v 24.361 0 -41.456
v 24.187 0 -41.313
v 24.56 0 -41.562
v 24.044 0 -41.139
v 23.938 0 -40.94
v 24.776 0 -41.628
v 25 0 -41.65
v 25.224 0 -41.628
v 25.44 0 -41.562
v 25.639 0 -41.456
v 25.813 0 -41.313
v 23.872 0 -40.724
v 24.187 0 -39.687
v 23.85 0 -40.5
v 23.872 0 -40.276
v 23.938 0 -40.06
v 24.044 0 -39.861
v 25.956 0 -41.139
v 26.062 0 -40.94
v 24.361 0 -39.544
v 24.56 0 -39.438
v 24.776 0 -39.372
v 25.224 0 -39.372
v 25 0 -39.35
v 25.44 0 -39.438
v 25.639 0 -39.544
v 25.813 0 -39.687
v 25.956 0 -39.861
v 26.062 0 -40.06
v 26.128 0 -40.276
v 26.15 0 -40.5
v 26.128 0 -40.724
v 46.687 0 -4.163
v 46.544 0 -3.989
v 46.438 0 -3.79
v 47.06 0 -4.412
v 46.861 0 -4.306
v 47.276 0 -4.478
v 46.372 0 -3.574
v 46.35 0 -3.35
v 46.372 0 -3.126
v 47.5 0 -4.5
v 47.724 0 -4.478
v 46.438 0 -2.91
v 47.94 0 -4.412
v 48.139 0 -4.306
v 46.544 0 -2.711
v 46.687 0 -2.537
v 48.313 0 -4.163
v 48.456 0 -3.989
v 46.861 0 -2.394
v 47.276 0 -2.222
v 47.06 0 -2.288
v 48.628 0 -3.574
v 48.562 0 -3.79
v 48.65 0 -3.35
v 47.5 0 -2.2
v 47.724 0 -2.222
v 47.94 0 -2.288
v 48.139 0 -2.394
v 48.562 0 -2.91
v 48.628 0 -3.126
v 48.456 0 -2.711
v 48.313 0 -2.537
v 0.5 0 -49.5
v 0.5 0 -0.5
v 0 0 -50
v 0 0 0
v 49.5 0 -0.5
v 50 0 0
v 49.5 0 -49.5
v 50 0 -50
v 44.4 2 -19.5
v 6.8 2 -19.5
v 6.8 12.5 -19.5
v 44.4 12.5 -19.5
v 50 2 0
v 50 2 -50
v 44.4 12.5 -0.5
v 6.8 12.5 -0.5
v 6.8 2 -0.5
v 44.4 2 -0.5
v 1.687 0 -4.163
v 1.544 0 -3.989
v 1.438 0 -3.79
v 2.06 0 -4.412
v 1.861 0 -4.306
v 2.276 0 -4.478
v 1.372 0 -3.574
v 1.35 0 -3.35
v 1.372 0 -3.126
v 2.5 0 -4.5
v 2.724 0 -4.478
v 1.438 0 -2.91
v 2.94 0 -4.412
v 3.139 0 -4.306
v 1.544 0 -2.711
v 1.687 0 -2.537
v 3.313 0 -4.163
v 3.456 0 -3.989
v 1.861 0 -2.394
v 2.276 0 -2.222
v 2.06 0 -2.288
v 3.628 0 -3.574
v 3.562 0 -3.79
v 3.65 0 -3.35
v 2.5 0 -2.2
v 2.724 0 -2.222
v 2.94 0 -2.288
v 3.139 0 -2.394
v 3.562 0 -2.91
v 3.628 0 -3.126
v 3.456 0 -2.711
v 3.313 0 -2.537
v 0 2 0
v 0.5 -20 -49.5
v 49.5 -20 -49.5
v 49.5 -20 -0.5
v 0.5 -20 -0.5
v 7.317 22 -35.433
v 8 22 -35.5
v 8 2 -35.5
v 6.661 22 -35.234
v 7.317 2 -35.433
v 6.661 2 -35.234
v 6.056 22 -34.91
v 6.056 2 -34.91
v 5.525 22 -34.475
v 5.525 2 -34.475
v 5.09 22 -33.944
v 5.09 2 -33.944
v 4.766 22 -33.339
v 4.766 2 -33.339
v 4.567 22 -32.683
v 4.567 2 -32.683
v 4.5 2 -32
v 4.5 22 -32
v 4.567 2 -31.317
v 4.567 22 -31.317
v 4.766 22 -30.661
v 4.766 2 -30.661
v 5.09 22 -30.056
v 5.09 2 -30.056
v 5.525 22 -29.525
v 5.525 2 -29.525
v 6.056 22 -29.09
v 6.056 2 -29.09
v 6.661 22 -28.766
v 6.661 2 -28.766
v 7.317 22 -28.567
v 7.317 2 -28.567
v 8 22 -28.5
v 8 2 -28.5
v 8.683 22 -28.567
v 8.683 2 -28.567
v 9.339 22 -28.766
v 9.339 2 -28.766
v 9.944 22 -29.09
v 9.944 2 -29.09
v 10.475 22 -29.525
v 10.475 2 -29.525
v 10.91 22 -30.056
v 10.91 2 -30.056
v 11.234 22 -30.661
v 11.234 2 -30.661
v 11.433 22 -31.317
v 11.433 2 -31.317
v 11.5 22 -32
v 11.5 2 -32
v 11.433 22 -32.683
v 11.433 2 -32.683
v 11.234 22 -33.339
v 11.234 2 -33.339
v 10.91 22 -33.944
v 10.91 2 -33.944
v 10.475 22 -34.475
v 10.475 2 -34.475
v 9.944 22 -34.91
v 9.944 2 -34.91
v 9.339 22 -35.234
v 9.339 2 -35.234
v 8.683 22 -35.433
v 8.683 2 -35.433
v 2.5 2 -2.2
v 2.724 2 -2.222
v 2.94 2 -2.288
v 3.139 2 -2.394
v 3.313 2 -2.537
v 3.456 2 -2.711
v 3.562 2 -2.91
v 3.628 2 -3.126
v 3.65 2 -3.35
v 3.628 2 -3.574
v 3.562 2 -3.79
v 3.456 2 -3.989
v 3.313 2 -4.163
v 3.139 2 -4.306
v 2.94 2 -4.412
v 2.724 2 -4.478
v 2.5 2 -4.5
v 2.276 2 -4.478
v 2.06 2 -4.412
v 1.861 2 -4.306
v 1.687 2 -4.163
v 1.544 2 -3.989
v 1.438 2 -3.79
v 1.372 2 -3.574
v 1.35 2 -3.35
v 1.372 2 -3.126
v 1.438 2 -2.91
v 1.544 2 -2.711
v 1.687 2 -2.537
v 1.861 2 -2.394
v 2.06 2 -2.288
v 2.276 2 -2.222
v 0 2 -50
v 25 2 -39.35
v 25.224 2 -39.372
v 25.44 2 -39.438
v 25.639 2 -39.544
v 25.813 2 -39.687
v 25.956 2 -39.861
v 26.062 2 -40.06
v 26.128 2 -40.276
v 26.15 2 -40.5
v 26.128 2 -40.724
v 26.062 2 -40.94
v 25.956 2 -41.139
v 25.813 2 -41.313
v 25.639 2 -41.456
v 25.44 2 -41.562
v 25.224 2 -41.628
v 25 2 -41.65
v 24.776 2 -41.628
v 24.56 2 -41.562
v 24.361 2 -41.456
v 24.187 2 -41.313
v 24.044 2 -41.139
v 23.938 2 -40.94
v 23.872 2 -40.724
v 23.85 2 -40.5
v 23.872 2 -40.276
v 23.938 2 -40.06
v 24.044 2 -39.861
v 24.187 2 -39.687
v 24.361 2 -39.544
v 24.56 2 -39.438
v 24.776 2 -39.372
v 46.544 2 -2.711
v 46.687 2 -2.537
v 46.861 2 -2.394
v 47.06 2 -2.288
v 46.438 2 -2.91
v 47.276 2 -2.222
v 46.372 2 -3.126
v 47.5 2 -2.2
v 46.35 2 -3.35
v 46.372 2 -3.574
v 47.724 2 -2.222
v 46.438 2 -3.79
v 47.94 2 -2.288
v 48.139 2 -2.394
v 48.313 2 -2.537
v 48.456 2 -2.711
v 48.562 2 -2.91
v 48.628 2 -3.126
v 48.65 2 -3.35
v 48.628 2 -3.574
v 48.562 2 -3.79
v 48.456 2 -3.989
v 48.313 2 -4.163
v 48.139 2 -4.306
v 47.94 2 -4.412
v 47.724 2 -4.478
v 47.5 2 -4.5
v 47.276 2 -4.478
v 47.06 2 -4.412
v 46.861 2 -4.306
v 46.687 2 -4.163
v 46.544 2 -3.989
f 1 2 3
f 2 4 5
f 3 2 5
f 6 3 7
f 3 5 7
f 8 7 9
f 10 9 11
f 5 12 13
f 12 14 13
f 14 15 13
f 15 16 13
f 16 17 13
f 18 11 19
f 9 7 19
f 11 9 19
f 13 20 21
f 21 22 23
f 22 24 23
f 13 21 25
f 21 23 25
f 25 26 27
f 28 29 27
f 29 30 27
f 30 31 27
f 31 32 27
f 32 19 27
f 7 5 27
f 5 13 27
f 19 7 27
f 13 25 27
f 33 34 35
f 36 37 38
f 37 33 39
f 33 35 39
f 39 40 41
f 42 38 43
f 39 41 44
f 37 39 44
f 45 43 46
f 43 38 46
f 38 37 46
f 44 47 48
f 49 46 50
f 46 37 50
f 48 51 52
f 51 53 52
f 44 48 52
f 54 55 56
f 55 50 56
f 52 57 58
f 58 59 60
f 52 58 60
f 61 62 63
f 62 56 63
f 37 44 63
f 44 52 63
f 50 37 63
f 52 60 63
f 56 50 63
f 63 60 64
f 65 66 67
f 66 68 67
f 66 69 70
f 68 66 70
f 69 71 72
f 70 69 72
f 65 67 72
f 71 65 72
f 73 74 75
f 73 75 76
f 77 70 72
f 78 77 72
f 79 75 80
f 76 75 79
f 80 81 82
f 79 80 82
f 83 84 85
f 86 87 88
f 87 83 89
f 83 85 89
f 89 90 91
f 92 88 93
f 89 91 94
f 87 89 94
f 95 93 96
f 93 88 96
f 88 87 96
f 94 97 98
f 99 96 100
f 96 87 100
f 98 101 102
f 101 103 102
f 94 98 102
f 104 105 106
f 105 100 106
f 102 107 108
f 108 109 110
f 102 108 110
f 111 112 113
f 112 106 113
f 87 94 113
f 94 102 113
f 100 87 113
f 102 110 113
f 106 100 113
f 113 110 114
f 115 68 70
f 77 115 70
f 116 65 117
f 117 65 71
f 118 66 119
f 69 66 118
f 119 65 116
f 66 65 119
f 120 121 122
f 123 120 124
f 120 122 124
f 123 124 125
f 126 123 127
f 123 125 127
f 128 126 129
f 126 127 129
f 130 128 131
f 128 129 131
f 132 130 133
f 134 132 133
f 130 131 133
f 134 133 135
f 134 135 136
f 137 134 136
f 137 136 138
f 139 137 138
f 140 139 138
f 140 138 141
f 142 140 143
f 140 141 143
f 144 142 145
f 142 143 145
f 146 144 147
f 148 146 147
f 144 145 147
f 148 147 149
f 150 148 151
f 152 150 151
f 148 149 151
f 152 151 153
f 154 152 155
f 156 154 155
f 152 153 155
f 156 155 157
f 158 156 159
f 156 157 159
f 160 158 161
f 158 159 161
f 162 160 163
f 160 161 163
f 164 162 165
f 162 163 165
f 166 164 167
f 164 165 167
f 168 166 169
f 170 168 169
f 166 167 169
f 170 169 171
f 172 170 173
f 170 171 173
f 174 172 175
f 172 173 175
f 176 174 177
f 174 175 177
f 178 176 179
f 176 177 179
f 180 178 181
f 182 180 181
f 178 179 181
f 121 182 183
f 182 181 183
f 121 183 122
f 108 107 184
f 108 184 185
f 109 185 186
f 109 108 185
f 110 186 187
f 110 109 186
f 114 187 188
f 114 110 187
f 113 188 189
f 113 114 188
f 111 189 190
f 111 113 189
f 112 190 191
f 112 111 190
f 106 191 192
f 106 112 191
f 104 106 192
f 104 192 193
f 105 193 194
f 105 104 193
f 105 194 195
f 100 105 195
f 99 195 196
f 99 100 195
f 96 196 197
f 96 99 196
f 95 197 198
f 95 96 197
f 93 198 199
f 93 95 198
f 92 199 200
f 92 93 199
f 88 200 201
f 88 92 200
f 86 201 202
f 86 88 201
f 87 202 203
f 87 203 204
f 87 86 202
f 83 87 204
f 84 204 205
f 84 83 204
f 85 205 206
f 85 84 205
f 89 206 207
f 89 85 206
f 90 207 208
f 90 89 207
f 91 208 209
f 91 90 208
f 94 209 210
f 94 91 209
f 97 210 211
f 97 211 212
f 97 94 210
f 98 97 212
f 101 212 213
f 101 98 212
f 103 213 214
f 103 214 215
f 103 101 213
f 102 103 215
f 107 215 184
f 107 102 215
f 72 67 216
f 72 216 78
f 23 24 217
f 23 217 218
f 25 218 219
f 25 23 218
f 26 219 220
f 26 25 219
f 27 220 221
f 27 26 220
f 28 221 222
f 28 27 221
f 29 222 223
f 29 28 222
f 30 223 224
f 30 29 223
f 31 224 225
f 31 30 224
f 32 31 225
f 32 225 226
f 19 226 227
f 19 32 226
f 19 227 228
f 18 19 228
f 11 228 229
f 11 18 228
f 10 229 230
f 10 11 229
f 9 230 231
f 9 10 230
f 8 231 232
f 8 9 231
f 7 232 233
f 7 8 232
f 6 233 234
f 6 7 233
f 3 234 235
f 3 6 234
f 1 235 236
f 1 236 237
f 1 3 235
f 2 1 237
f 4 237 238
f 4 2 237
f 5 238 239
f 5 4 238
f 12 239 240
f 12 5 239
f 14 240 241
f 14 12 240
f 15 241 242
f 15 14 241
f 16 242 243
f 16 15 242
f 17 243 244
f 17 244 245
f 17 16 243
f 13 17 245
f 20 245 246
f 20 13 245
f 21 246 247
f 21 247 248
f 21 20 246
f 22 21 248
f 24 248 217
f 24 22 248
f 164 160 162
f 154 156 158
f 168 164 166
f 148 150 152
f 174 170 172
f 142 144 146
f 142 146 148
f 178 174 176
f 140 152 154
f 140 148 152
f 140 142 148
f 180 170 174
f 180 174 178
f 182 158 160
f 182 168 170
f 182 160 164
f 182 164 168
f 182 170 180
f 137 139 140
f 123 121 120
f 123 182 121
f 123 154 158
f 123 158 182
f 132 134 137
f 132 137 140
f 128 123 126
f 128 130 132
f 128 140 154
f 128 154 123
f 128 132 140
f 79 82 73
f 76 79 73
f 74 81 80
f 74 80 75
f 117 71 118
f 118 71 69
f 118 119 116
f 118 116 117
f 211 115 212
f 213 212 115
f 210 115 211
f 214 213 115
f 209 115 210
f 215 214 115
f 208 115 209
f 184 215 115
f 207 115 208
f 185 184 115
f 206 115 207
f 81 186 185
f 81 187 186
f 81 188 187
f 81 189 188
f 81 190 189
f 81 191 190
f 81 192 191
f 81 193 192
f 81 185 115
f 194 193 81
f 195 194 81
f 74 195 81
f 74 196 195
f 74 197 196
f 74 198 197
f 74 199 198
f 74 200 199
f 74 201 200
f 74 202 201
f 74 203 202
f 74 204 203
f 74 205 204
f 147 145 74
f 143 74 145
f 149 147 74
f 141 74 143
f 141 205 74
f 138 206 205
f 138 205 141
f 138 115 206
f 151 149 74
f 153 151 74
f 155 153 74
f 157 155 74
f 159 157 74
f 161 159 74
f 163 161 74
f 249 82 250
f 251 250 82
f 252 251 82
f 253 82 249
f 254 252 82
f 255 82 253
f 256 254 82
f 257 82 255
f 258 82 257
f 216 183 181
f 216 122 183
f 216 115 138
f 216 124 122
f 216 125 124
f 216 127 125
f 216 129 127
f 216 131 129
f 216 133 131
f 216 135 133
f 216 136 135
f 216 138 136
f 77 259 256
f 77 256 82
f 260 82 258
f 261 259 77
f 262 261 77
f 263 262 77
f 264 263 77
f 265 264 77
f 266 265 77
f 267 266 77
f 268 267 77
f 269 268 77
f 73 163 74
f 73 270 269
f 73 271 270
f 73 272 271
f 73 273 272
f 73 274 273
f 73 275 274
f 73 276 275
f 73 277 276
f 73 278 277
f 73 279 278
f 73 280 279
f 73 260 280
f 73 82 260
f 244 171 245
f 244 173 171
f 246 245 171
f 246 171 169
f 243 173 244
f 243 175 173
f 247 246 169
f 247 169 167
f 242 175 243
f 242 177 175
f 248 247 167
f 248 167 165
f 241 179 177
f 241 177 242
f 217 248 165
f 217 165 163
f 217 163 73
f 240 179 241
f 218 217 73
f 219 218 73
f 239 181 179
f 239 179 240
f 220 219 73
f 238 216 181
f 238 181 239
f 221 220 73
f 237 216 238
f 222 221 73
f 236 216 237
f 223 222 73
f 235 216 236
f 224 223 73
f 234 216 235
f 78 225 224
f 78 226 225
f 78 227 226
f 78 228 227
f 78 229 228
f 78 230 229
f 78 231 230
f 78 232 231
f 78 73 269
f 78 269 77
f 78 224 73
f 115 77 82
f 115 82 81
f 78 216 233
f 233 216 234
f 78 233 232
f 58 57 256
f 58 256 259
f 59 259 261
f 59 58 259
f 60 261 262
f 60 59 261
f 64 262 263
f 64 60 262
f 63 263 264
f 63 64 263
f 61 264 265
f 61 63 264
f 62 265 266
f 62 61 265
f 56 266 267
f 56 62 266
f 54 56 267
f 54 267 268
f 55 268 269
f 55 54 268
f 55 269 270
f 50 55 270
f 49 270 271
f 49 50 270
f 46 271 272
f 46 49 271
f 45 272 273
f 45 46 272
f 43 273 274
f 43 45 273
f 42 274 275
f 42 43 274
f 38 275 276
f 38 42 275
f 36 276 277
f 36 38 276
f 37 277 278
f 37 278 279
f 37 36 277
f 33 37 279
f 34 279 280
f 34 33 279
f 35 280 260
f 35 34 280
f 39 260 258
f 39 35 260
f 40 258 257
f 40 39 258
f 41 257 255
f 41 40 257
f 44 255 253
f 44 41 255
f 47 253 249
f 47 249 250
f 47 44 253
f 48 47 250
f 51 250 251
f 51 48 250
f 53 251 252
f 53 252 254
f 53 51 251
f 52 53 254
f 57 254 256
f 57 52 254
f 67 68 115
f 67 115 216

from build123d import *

# Parameters (mm, degrees)
SKETCH1_W           = 50
SKETCH1_H           = 50
SKETCH1_R           = 1.15
BOSS_EXTRUDE1_DEPTH = 2
SKETCH2_W           = 37.6
SKETCH2_H           = 19
BOSS_EXTRUDE2_DEPTH = 10.5
SKETCH3_R           = 3.5
BOSS_EXTRUDE3_DEPTH = 20
SKETCH4_W           = 49
SKETCH4_H           = 49
BOSS_EXTRUDE4_DEPTH = 20


with BuildPart() as part:
    # Sketch1 → Boss-Extrude1 (new body)
    with BuildSketch(Plane(origin=(0, 0, 0), x_dir=(1, 0, 0), z_dir=(0, 1, 0))):
        with Locations((25, 25)):
            Rectangle(SKETCH1_W, SKETCH1_H)
        with Locations(Location((2.5, 3.35, 0), (0, 0, 270))):
            Circle(SKETCH1_R, mode=Mode.SUBTRACT)
        with Locations(Location((47.5, 3.35, 0), (0, 0, 270))):
            Circle(SKETCH1_R, mode=Mode.SUBTRACT)
        with Locations(Location((25, 40.5, 0), (0, 0, 270))):
            Circle(SKETCH1_R, mode=Mode.SUBTRACT)
    extrude(amount=BOSS_EXTRUDE1_DEPTH)

    # Sketch2 → Boss-Extrude2 (add)
    with BuildSketch(Plane(origin=(0, 2, 0), x_dir=(1, 0, 0), z_dir=(0, 1, 0))):
        with Locations((25.6, 10)):
            Rectangle(SKETCH2_W, SKETCH2_H)
    extrude(amount=BOSS_EXTRUDE2_DEPTH)

    # Sketch3 → Boss-Extrude3 (add)
    with BuildSketch(Plane(origin=(0, 2, 0), x_dir=(1, 0, 0), z_dir=(0, 1, 0))):
        with Locations(Location((8, 32, 0), (0, 0, 90))):
            Circle(SKETCH3_R)
    extrude(amount=BOSS_EXTRUDE3_DEPTH)

    # Sketch4 → Boss-Extrude4 (add)
    with BuildSketch(Plane.XZ):
        with Locations((25, -25)):
            Rectangle(SKETCH4_W, SKETCH4_H)
    extrude(amount=BOSS_EXTRUDE4_DEPTH)


solid = part.part
